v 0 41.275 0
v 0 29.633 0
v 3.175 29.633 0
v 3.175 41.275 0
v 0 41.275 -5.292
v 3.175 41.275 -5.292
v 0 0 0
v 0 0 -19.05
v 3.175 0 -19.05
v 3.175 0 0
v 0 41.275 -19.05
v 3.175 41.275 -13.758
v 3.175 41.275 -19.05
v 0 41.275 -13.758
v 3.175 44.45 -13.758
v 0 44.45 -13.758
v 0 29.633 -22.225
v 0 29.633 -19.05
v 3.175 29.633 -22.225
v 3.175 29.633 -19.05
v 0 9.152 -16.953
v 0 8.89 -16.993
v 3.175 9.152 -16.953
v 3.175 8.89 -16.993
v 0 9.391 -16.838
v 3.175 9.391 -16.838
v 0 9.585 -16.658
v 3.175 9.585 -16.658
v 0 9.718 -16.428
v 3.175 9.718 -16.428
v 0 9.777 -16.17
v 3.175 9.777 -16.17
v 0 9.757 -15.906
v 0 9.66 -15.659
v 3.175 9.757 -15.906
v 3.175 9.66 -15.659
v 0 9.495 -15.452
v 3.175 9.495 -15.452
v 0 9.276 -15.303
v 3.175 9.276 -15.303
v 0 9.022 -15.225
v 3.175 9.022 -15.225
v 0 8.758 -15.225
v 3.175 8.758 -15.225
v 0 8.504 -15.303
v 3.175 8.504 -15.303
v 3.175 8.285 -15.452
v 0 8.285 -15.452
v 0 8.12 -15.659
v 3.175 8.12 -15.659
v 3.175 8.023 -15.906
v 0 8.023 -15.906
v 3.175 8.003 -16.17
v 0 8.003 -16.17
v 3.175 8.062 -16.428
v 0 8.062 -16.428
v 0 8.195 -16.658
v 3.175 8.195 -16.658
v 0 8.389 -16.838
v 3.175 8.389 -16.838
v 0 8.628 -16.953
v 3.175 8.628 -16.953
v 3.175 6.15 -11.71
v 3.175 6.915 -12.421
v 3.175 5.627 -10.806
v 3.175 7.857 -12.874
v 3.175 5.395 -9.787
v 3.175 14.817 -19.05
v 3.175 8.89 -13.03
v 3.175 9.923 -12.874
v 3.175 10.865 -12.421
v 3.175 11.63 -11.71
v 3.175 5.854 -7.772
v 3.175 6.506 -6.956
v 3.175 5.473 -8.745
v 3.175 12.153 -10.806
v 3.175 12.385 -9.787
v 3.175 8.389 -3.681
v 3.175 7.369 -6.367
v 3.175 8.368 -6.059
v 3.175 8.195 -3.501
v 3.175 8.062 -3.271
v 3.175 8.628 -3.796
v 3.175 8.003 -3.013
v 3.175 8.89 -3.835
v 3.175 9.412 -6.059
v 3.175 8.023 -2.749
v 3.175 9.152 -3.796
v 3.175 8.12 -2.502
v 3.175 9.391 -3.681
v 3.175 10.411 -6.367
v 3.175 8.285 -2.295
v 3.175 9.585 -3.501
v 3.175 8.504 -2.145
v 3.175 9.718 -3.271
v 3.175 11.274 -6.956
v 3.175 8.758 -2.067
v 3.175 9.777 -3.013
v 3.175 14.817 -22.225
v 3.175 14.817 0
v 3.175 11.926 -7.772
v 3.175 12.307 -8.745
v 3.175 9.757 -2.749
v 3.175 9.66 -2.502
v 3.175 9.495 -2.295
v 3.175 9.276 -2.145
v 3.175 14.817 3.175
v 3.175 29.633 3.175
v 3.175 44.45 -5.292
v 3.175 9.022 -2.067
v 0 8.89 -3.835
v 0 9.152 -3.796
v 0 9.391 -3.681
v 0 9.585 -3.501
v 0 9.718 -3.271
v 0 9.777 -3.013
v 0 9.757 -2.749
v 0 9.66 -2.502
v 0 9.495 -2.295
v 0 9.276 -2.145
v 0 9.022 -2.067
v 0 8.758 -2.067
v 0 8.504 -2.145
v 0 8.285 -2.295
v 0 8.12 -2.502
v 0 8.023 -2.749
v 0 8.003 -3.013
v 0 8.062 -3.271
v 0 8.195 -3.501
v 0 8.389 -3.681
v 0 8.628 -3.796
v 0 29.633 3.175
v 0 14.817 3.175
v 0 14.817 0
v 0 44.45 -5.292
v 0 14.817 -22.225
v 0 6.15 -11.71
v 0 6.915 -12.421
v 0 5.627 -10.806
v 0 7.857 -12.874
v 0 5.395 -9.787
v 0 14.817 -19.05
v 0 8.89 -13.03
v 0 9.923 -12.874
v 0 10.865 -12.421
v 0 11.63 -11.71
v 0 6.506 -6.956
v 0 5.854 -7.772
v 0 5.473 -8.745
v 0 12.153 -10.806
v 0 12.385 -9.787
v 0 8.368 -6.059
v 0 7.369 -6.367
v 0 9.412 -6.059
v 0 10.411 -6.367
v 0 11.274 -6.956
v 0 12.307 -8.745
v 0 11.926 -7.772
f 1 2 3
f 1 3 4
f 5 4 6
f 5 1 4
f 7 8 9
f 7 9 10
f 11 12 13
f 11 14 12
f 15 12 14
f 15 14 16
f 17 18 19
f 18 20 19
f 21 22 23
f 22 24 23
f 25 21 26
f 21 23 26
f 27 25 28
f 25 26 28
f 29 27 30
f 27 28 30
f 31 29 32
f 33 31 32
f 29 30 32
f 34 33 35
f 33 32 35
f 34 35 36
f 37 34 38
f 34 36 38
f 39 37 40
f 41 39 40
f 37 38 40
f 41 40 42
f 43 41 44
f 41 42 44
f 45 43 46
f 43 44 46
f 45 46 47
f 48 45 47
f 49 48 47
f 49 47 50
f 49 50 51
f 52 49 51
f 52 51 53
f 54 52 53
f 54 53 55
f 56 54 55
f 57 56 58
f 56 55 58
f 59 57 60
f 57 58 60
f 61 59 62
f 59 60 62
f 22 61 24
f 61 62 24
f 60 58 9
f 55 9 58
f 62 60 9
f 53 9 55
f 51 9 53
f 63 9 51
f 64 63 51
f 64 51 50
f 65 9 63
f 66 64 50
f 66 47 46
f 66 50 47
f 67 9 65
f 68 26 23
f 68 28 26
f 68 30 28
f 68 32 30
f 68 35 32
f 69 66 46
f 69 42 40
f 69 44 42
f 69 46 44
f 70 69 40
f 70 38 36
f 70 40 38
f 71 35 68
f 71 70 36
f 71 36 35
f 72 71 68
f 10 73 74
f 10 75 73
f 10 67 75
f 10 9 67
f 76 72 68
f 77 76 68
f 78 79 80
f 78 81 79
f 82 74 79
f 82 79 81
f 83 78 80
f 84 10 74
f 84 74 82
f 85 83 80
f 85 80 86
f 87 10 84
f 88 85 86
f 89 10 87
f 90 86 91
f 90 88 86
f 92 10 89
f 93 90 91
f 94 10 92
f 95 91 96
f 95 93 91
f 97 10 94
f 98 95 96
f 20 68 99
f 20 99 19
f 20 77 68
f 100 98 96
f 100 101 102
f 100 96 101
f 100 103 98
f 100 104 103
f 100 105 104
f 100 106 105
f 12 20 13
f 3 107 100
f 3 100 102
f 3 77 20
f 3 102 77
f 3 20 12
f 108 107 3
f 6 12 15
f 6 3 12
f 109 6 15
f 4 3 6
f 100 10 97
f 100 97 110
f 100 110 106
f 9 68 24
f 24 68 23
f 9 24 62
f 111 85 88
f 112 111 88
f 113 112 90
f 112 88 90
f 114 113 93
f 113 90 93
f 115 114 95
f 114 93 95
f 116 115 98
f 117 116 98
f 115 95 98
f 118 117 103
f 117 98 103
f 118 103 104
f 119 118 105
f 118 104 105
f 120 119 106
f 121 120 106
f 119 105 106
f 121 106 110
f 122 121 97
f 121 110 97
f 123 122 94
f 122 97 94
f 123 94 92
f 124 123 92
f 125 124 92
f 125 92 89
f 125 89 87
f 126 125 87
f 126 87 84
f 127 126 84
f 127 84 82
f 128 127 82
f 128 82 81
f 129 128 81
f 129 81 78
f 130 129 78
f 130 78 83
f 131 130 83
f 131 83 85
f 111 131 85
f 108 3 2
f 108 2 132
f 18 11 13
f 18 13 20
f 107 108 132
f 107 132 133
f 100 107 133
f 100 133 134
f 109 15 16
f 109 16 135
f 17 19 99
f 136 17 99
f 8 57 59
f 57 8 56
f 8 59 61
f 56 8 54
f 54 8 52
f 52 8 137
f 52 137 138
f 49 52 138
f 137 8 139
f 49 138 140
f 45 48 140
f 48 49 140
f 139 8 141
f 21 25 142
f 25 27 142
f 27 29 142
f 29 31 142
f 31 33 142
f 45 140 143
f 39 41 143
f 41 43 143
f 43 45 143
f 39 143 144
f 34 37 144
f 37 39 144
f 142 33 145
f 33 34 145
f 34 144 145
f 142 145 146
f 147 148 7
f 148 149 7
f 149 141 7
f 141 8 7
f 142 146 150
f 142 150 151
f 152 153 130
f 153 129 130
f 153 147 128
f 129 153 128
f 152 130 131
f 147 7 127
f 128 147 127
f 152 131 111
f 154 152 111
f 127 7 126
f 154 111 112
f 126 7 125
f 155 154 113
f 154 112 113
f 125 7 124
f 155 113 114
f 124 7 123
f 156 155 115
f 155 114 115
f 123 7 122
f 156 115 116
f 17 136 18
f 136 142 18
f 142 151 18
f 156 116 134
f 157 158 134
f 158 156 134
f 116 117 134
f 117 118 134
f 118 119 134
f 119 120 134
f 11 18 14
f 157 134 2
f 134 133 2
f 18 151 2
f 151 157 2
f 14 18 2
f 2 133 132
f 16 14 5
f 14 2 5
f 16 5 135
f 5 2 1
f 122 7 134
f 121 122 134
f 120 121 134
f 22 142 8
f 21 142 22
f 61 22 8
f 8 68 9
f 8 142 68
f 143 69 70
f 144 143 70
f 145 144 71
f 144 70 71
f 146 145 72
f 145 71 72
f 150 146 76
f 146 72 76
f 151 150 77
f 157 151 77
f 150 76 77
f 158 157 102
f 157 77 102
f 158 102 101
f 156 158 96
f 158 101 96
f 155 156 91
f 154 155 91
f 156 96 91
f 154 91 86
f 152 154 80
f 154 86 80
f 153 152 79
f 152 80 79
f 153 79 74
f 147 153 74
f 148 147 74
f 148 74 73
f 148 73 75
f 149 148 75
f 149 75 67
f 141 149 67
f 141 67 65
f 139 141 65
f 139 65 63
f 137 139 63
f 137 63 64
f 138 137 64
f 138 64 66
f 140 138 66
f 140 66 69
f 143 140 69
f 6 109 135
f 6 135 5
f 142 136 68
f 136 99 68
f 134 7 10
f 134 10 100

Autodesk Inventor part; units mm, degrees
ref_plane "YZ Plane" through (0, 0, 0) normal (1, 0, 0) x (0, 1, 0)
ref_plane "XZ Plane" through (0, 0, 0) normal (0, 1, 0) x (-1, 0, 0)
ref_plane "XY Plane" through (0, 0, 0) normal (0, 0, 1) x (1, 0, 0)
sketch "Sketch1" plane through (0, 0, 0) normal (1, 0, 0) x (0, 1, 0)
  line L0 (0, 0) -> (41.275, 0)
  line L1 (41.275, 0) -> (41.275, -19.05)
  line L2 (41.275, -19.05) -> (0, -19.05)
  line L3 (0, -19.05) -> (0, 0)
  dimension "d0" = 41.275
  dimension "d1" = 19.05
extrude "Extrusion1" add sketch "Sketch1" along normal blind 3.175
sketch "Sketch2" plane through (3.175, 0, 0) normal (1, 0, 0) x (0, 0, -1)
  line L0 (0, 41.275) -> (0, 0) projected
  line L1 (0, 0) -> (19.05, 0) projected
  line L2 (19.05, 0) -> (19.05, 41.275) projected
  line L3 (19.05, 41.275) -> (0, 41.275) projected
  line L4 (5.2917, 41.275) -> (13.7583, 41.275)
  line L5 (13.7583, 41.275) -> (13.7583, 44.45)
  line L6 (13.7583, 44.45) -> (5.2917, 44.45)
  line L7 (5.2917, 44.45) -> (5.2917, 41.275)
  line L8 (19.05, 29.6333) -> (22.225, 29.6333)
  line L9 (22.225, 29.6333) -> (22.225, 14.8167)
  line L10 (22.225, 14.8167) -> (19.05, 14.8167)
  line L11 (19.05, 14.8167) -> (19.05, 29.6333)
  line L12 (0, 29.6333) -> (-3.175, 29.6333)
  line L13 (-3.175, 29.6333) -> (-3.175, 14.8167)
  line L14 (-3.175, 14.8167) -> (0, 14.8167)
  line L15 (0, 14.8167) -> (0, 29.6333)
  dimension "d4" = 8.4667
  dimension "d5" = 3.175
  dimension "d6" = 5.2917
  dimension "d7" = 3.175
  dimension "d8" = 14.8167
  dimension "d9" = 3.175
  dimension "d10" = 14.8167
  dimension "d11" = 14.8167
extrude "Extrusion2" add sketch "Sketch2" against normal blind 3.175 contours L0 L14 L13 L12 | L7 L6 L5 L3 | L8 L9 L10 L2
sketch "Sketch3" plane through (3.175, 0, 0) normal (1, 0, 0) x (0, 0, -1)
  line L0 (-3.175, 29.6333) -> (-3.175, 14.8167) projected
  line L1 (0, 0) -> (19.05, 0) projected
  circle A0 centre (9.525, 8.89) radius 3.5052
  circle A1 centre (16.1036, 8.89) radius 0.889
  circle A2 centre (2.9464, 8.89) radius 0.889
  dimension "d14" = 7.0104
  dimension "d15" = 12.7
  dimension "d16" = 8.89
  dimension "d17" = 1.778
  dimension "d18" = 1.778
  dimension "d19" = 13.1572
  dimension "d20" = 6.5786
extrude "Extrusion3" cut sketch "Sketch3" against normal blind 3.175
equation "\"d0\" = angleHeight - thick"
equation "\"d1\" = angleDepth - 2 * thick"
equation "\"d2\" = thick"
equation "\"d4\" = 0.333333 * angleDepth"
equation "\"d5\" = thick"
equation "\"d6\" = 0.333333 * angleDepth - thick"
equation "\"d7\" = thick"
equation "\"d8\" = 0.333333 * angleHeight"
equation "\"d9\" = thick"
equation "\"d10\" = 0.333333 * angleHeight"
equation "\"d11\" = 0.333333 * angleHeight"
equation "\"d12\" = thick"
equation "\"d14\" = hornCenter"
equation "\"d15\" = 0.5 * angleDepth"
equation "\"d16\" = hornOffset"
equation "\"d17\" = hornHole"
equation "\"d18\" = hornHole"
equation "\"d19\" = hornDia"
equation "\"d20\" = 0.5 * hornDia"
equation "\"d21\" = thick"
equation "\"angleHeight\" = 44.45"
equation "\"angleDepth\" = 25.4"
equation "\"hornCenter\" = 7.0104"
equation "\"hornOffset\" = 8.89"
equation "\"thick\" = 3.175"
equation "\"hornHole\" = 1.778"
equation "\"hornDia\" = 13.1572"
properties part number "AngleLower"
